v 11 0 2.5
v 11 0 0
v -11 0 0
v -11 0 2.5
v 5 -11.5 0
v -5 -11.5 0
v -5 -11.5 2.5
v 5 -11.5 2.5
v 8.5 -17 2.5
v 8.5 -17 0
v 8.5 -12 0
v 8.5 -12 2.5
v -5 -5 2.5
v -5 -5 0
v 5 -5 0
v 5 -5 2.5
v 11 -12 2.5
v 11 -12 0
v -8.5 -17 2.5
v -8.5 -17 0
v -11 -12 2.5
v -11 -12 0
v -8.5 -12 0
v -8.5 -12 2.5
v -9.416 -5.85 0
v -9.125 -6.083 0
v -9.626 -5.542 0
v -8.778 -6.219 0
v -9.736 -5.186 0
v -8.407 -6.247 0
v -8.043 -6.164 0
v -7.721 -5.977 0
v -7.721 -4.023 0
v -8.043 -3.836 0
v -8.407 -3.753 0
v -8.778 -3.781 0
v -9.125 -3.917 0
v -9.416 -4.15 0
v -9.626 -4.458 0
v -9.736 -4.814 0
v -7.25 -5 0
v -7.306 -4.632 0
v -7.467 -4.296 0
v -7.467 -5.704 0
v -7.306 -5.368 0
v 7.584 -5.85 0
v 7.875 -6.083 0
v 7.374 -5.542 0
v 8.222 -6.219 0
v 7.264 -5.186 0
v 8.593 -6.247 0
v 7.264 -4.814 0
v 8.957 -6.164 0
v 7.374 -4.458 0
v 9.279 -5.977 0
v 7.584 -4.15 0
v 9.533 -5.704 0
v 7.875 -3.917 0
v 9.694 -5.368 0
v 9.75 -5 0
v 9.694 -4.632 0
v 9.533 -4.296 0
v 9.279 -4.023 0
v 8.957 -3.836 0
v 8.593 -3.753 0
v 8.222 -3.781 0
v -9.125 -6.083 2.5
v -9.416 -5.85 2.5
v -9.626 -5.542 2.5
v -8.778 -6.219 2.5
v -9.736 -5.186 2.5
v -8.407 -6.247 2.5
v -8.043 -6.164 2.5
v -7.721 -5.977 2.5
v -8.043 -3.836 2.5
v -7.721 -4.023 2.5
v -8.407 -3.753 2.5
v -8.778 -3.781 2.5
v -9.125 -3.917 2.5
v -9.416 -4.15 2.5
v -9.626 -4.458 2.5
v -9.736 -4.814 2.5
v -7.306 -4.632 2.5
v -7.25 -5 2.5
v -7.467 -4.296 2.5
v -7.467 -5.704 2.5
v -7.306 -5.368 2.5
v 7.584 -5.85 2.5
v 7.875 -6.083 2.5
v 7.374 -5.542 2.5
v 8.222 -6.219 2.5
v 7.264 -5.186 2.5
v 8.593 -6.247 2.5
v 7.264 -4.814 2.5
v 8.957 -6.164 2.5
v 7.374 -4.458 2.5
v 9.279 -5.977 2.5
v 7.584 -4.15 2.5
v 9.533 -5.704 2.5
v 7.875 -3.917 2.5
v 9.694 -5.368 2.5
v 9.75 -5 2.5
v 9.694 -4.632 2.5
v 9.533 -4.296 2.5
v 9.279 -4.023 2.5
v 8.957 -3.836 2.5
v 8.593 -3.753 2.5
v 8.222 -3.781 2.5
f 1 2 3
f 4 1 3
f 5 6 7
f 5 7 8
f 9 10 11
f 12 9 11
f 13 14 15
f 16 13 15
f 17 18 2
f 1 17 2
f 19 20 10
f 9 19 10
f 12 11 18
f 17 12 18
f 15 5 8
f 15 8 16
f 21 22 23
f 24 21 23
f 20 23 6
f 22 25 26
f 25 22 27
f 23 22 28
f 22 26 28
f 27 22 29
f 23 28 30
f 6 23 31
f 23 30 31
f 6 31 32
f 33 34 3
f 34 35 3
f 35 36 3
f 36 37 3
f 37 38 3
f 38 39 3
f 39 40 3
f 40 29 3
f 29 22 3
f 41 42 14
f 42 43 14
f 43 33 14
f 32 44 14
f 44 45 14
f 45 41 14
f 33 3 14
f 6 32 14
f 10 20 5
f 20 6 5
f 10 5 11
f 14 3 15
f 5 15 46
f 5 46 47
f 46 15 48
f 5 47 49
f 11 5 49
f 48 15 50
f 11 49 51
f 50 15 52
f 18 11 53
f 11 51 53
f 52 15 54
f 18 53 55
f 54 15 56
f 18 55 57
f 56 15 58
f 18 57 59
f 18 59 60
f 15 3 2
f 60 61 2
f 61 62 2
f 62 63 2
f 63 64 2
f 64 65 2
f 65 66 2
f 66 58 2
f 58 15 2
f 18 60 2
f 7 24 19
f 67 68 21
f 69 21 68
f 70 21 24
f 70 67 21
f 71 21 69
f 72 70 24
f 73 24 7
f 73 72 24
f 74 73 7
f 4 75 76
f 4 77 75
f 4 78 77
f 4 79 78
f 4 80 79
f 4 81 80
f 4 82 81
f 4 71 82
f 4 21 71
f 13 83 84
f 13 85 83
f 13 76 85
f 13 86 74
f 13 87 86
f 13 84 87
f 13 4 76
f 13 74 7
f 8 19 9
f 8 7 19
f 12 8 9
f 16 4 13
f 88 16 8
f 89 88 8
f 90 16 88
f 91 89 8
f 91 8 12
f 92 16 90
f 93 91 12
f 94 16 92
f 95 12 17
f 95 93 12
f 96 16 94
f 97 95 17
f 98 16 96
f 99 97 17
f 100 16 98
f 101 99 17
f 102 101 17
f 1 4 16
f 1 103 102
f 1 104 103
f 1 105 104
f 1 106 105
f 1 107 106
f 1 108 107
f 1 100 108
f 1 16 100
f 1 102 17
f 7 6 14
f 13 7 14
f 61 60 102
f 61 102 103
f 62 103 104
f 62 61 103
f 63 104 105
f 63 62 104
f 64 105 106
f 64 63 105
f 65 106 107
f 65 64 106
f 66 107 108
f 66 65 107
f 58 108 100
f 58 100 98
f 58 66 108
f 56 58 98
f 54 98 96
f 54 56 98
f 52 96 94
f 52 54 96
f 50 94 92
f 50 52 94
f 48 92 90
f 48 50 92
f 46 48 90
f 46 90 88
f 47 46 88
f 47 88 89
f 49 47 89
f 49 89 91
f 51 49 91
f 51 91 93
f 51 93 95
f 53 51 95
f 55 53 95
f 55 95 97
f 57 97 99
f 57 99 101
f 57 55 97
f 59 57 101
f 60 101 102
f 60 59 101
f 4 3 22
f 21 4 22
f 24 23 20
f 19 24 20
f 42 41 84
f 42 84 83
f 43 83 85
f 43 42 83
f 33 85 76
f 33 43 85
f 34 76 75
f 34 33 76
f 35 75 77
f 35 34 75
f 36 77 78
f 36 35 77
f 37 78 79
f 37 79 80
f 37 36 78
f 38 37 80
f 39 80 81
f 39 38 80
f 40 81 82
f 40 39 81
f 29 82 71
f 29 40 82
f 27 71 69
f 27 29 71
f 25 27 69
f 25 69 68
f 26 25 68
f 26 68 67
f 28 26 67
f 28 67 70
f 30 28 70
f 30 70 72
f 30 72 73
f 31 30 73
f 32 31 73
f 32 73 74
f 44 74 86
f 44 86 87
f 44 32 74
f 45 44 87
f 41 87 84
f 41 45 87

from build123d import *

# Parameters (mm, degrees)
SKETCH1_R           = 1.25
SKETCH1_W           = 10
SKETCH1_H           = 6.5
BOSS_EXTRUDE1_DEPTH = 2.5


with BuildPart() as part:
    # Sketch1 → Boss-Extrude1 (new body)
    with BuildSketch(Plane.XY):
        Polygon((-8.5, -12), (-8.5, -17), (8.5, -17), (8.5, -12), (11, -12), (11, 0), (-11, 0), (-11, -12), align=None)
        with Locations((-8.5, -5)):
            Circle(SKETCH1_R, mode=Mode.SUBTRACT)
        with Locations((8.5, -5)):
            Circle(SKETCH1_R, mode=Mode.SUBTRACT)
        with Locations((0, -8.25)):
            Rectangle(SKETCH1_W, SKETCH1_H, mode=Mode.SUBTRACT)
    extrude(amount=BOSS_EXTRUDE1_DEPTH)


solid = part.part
